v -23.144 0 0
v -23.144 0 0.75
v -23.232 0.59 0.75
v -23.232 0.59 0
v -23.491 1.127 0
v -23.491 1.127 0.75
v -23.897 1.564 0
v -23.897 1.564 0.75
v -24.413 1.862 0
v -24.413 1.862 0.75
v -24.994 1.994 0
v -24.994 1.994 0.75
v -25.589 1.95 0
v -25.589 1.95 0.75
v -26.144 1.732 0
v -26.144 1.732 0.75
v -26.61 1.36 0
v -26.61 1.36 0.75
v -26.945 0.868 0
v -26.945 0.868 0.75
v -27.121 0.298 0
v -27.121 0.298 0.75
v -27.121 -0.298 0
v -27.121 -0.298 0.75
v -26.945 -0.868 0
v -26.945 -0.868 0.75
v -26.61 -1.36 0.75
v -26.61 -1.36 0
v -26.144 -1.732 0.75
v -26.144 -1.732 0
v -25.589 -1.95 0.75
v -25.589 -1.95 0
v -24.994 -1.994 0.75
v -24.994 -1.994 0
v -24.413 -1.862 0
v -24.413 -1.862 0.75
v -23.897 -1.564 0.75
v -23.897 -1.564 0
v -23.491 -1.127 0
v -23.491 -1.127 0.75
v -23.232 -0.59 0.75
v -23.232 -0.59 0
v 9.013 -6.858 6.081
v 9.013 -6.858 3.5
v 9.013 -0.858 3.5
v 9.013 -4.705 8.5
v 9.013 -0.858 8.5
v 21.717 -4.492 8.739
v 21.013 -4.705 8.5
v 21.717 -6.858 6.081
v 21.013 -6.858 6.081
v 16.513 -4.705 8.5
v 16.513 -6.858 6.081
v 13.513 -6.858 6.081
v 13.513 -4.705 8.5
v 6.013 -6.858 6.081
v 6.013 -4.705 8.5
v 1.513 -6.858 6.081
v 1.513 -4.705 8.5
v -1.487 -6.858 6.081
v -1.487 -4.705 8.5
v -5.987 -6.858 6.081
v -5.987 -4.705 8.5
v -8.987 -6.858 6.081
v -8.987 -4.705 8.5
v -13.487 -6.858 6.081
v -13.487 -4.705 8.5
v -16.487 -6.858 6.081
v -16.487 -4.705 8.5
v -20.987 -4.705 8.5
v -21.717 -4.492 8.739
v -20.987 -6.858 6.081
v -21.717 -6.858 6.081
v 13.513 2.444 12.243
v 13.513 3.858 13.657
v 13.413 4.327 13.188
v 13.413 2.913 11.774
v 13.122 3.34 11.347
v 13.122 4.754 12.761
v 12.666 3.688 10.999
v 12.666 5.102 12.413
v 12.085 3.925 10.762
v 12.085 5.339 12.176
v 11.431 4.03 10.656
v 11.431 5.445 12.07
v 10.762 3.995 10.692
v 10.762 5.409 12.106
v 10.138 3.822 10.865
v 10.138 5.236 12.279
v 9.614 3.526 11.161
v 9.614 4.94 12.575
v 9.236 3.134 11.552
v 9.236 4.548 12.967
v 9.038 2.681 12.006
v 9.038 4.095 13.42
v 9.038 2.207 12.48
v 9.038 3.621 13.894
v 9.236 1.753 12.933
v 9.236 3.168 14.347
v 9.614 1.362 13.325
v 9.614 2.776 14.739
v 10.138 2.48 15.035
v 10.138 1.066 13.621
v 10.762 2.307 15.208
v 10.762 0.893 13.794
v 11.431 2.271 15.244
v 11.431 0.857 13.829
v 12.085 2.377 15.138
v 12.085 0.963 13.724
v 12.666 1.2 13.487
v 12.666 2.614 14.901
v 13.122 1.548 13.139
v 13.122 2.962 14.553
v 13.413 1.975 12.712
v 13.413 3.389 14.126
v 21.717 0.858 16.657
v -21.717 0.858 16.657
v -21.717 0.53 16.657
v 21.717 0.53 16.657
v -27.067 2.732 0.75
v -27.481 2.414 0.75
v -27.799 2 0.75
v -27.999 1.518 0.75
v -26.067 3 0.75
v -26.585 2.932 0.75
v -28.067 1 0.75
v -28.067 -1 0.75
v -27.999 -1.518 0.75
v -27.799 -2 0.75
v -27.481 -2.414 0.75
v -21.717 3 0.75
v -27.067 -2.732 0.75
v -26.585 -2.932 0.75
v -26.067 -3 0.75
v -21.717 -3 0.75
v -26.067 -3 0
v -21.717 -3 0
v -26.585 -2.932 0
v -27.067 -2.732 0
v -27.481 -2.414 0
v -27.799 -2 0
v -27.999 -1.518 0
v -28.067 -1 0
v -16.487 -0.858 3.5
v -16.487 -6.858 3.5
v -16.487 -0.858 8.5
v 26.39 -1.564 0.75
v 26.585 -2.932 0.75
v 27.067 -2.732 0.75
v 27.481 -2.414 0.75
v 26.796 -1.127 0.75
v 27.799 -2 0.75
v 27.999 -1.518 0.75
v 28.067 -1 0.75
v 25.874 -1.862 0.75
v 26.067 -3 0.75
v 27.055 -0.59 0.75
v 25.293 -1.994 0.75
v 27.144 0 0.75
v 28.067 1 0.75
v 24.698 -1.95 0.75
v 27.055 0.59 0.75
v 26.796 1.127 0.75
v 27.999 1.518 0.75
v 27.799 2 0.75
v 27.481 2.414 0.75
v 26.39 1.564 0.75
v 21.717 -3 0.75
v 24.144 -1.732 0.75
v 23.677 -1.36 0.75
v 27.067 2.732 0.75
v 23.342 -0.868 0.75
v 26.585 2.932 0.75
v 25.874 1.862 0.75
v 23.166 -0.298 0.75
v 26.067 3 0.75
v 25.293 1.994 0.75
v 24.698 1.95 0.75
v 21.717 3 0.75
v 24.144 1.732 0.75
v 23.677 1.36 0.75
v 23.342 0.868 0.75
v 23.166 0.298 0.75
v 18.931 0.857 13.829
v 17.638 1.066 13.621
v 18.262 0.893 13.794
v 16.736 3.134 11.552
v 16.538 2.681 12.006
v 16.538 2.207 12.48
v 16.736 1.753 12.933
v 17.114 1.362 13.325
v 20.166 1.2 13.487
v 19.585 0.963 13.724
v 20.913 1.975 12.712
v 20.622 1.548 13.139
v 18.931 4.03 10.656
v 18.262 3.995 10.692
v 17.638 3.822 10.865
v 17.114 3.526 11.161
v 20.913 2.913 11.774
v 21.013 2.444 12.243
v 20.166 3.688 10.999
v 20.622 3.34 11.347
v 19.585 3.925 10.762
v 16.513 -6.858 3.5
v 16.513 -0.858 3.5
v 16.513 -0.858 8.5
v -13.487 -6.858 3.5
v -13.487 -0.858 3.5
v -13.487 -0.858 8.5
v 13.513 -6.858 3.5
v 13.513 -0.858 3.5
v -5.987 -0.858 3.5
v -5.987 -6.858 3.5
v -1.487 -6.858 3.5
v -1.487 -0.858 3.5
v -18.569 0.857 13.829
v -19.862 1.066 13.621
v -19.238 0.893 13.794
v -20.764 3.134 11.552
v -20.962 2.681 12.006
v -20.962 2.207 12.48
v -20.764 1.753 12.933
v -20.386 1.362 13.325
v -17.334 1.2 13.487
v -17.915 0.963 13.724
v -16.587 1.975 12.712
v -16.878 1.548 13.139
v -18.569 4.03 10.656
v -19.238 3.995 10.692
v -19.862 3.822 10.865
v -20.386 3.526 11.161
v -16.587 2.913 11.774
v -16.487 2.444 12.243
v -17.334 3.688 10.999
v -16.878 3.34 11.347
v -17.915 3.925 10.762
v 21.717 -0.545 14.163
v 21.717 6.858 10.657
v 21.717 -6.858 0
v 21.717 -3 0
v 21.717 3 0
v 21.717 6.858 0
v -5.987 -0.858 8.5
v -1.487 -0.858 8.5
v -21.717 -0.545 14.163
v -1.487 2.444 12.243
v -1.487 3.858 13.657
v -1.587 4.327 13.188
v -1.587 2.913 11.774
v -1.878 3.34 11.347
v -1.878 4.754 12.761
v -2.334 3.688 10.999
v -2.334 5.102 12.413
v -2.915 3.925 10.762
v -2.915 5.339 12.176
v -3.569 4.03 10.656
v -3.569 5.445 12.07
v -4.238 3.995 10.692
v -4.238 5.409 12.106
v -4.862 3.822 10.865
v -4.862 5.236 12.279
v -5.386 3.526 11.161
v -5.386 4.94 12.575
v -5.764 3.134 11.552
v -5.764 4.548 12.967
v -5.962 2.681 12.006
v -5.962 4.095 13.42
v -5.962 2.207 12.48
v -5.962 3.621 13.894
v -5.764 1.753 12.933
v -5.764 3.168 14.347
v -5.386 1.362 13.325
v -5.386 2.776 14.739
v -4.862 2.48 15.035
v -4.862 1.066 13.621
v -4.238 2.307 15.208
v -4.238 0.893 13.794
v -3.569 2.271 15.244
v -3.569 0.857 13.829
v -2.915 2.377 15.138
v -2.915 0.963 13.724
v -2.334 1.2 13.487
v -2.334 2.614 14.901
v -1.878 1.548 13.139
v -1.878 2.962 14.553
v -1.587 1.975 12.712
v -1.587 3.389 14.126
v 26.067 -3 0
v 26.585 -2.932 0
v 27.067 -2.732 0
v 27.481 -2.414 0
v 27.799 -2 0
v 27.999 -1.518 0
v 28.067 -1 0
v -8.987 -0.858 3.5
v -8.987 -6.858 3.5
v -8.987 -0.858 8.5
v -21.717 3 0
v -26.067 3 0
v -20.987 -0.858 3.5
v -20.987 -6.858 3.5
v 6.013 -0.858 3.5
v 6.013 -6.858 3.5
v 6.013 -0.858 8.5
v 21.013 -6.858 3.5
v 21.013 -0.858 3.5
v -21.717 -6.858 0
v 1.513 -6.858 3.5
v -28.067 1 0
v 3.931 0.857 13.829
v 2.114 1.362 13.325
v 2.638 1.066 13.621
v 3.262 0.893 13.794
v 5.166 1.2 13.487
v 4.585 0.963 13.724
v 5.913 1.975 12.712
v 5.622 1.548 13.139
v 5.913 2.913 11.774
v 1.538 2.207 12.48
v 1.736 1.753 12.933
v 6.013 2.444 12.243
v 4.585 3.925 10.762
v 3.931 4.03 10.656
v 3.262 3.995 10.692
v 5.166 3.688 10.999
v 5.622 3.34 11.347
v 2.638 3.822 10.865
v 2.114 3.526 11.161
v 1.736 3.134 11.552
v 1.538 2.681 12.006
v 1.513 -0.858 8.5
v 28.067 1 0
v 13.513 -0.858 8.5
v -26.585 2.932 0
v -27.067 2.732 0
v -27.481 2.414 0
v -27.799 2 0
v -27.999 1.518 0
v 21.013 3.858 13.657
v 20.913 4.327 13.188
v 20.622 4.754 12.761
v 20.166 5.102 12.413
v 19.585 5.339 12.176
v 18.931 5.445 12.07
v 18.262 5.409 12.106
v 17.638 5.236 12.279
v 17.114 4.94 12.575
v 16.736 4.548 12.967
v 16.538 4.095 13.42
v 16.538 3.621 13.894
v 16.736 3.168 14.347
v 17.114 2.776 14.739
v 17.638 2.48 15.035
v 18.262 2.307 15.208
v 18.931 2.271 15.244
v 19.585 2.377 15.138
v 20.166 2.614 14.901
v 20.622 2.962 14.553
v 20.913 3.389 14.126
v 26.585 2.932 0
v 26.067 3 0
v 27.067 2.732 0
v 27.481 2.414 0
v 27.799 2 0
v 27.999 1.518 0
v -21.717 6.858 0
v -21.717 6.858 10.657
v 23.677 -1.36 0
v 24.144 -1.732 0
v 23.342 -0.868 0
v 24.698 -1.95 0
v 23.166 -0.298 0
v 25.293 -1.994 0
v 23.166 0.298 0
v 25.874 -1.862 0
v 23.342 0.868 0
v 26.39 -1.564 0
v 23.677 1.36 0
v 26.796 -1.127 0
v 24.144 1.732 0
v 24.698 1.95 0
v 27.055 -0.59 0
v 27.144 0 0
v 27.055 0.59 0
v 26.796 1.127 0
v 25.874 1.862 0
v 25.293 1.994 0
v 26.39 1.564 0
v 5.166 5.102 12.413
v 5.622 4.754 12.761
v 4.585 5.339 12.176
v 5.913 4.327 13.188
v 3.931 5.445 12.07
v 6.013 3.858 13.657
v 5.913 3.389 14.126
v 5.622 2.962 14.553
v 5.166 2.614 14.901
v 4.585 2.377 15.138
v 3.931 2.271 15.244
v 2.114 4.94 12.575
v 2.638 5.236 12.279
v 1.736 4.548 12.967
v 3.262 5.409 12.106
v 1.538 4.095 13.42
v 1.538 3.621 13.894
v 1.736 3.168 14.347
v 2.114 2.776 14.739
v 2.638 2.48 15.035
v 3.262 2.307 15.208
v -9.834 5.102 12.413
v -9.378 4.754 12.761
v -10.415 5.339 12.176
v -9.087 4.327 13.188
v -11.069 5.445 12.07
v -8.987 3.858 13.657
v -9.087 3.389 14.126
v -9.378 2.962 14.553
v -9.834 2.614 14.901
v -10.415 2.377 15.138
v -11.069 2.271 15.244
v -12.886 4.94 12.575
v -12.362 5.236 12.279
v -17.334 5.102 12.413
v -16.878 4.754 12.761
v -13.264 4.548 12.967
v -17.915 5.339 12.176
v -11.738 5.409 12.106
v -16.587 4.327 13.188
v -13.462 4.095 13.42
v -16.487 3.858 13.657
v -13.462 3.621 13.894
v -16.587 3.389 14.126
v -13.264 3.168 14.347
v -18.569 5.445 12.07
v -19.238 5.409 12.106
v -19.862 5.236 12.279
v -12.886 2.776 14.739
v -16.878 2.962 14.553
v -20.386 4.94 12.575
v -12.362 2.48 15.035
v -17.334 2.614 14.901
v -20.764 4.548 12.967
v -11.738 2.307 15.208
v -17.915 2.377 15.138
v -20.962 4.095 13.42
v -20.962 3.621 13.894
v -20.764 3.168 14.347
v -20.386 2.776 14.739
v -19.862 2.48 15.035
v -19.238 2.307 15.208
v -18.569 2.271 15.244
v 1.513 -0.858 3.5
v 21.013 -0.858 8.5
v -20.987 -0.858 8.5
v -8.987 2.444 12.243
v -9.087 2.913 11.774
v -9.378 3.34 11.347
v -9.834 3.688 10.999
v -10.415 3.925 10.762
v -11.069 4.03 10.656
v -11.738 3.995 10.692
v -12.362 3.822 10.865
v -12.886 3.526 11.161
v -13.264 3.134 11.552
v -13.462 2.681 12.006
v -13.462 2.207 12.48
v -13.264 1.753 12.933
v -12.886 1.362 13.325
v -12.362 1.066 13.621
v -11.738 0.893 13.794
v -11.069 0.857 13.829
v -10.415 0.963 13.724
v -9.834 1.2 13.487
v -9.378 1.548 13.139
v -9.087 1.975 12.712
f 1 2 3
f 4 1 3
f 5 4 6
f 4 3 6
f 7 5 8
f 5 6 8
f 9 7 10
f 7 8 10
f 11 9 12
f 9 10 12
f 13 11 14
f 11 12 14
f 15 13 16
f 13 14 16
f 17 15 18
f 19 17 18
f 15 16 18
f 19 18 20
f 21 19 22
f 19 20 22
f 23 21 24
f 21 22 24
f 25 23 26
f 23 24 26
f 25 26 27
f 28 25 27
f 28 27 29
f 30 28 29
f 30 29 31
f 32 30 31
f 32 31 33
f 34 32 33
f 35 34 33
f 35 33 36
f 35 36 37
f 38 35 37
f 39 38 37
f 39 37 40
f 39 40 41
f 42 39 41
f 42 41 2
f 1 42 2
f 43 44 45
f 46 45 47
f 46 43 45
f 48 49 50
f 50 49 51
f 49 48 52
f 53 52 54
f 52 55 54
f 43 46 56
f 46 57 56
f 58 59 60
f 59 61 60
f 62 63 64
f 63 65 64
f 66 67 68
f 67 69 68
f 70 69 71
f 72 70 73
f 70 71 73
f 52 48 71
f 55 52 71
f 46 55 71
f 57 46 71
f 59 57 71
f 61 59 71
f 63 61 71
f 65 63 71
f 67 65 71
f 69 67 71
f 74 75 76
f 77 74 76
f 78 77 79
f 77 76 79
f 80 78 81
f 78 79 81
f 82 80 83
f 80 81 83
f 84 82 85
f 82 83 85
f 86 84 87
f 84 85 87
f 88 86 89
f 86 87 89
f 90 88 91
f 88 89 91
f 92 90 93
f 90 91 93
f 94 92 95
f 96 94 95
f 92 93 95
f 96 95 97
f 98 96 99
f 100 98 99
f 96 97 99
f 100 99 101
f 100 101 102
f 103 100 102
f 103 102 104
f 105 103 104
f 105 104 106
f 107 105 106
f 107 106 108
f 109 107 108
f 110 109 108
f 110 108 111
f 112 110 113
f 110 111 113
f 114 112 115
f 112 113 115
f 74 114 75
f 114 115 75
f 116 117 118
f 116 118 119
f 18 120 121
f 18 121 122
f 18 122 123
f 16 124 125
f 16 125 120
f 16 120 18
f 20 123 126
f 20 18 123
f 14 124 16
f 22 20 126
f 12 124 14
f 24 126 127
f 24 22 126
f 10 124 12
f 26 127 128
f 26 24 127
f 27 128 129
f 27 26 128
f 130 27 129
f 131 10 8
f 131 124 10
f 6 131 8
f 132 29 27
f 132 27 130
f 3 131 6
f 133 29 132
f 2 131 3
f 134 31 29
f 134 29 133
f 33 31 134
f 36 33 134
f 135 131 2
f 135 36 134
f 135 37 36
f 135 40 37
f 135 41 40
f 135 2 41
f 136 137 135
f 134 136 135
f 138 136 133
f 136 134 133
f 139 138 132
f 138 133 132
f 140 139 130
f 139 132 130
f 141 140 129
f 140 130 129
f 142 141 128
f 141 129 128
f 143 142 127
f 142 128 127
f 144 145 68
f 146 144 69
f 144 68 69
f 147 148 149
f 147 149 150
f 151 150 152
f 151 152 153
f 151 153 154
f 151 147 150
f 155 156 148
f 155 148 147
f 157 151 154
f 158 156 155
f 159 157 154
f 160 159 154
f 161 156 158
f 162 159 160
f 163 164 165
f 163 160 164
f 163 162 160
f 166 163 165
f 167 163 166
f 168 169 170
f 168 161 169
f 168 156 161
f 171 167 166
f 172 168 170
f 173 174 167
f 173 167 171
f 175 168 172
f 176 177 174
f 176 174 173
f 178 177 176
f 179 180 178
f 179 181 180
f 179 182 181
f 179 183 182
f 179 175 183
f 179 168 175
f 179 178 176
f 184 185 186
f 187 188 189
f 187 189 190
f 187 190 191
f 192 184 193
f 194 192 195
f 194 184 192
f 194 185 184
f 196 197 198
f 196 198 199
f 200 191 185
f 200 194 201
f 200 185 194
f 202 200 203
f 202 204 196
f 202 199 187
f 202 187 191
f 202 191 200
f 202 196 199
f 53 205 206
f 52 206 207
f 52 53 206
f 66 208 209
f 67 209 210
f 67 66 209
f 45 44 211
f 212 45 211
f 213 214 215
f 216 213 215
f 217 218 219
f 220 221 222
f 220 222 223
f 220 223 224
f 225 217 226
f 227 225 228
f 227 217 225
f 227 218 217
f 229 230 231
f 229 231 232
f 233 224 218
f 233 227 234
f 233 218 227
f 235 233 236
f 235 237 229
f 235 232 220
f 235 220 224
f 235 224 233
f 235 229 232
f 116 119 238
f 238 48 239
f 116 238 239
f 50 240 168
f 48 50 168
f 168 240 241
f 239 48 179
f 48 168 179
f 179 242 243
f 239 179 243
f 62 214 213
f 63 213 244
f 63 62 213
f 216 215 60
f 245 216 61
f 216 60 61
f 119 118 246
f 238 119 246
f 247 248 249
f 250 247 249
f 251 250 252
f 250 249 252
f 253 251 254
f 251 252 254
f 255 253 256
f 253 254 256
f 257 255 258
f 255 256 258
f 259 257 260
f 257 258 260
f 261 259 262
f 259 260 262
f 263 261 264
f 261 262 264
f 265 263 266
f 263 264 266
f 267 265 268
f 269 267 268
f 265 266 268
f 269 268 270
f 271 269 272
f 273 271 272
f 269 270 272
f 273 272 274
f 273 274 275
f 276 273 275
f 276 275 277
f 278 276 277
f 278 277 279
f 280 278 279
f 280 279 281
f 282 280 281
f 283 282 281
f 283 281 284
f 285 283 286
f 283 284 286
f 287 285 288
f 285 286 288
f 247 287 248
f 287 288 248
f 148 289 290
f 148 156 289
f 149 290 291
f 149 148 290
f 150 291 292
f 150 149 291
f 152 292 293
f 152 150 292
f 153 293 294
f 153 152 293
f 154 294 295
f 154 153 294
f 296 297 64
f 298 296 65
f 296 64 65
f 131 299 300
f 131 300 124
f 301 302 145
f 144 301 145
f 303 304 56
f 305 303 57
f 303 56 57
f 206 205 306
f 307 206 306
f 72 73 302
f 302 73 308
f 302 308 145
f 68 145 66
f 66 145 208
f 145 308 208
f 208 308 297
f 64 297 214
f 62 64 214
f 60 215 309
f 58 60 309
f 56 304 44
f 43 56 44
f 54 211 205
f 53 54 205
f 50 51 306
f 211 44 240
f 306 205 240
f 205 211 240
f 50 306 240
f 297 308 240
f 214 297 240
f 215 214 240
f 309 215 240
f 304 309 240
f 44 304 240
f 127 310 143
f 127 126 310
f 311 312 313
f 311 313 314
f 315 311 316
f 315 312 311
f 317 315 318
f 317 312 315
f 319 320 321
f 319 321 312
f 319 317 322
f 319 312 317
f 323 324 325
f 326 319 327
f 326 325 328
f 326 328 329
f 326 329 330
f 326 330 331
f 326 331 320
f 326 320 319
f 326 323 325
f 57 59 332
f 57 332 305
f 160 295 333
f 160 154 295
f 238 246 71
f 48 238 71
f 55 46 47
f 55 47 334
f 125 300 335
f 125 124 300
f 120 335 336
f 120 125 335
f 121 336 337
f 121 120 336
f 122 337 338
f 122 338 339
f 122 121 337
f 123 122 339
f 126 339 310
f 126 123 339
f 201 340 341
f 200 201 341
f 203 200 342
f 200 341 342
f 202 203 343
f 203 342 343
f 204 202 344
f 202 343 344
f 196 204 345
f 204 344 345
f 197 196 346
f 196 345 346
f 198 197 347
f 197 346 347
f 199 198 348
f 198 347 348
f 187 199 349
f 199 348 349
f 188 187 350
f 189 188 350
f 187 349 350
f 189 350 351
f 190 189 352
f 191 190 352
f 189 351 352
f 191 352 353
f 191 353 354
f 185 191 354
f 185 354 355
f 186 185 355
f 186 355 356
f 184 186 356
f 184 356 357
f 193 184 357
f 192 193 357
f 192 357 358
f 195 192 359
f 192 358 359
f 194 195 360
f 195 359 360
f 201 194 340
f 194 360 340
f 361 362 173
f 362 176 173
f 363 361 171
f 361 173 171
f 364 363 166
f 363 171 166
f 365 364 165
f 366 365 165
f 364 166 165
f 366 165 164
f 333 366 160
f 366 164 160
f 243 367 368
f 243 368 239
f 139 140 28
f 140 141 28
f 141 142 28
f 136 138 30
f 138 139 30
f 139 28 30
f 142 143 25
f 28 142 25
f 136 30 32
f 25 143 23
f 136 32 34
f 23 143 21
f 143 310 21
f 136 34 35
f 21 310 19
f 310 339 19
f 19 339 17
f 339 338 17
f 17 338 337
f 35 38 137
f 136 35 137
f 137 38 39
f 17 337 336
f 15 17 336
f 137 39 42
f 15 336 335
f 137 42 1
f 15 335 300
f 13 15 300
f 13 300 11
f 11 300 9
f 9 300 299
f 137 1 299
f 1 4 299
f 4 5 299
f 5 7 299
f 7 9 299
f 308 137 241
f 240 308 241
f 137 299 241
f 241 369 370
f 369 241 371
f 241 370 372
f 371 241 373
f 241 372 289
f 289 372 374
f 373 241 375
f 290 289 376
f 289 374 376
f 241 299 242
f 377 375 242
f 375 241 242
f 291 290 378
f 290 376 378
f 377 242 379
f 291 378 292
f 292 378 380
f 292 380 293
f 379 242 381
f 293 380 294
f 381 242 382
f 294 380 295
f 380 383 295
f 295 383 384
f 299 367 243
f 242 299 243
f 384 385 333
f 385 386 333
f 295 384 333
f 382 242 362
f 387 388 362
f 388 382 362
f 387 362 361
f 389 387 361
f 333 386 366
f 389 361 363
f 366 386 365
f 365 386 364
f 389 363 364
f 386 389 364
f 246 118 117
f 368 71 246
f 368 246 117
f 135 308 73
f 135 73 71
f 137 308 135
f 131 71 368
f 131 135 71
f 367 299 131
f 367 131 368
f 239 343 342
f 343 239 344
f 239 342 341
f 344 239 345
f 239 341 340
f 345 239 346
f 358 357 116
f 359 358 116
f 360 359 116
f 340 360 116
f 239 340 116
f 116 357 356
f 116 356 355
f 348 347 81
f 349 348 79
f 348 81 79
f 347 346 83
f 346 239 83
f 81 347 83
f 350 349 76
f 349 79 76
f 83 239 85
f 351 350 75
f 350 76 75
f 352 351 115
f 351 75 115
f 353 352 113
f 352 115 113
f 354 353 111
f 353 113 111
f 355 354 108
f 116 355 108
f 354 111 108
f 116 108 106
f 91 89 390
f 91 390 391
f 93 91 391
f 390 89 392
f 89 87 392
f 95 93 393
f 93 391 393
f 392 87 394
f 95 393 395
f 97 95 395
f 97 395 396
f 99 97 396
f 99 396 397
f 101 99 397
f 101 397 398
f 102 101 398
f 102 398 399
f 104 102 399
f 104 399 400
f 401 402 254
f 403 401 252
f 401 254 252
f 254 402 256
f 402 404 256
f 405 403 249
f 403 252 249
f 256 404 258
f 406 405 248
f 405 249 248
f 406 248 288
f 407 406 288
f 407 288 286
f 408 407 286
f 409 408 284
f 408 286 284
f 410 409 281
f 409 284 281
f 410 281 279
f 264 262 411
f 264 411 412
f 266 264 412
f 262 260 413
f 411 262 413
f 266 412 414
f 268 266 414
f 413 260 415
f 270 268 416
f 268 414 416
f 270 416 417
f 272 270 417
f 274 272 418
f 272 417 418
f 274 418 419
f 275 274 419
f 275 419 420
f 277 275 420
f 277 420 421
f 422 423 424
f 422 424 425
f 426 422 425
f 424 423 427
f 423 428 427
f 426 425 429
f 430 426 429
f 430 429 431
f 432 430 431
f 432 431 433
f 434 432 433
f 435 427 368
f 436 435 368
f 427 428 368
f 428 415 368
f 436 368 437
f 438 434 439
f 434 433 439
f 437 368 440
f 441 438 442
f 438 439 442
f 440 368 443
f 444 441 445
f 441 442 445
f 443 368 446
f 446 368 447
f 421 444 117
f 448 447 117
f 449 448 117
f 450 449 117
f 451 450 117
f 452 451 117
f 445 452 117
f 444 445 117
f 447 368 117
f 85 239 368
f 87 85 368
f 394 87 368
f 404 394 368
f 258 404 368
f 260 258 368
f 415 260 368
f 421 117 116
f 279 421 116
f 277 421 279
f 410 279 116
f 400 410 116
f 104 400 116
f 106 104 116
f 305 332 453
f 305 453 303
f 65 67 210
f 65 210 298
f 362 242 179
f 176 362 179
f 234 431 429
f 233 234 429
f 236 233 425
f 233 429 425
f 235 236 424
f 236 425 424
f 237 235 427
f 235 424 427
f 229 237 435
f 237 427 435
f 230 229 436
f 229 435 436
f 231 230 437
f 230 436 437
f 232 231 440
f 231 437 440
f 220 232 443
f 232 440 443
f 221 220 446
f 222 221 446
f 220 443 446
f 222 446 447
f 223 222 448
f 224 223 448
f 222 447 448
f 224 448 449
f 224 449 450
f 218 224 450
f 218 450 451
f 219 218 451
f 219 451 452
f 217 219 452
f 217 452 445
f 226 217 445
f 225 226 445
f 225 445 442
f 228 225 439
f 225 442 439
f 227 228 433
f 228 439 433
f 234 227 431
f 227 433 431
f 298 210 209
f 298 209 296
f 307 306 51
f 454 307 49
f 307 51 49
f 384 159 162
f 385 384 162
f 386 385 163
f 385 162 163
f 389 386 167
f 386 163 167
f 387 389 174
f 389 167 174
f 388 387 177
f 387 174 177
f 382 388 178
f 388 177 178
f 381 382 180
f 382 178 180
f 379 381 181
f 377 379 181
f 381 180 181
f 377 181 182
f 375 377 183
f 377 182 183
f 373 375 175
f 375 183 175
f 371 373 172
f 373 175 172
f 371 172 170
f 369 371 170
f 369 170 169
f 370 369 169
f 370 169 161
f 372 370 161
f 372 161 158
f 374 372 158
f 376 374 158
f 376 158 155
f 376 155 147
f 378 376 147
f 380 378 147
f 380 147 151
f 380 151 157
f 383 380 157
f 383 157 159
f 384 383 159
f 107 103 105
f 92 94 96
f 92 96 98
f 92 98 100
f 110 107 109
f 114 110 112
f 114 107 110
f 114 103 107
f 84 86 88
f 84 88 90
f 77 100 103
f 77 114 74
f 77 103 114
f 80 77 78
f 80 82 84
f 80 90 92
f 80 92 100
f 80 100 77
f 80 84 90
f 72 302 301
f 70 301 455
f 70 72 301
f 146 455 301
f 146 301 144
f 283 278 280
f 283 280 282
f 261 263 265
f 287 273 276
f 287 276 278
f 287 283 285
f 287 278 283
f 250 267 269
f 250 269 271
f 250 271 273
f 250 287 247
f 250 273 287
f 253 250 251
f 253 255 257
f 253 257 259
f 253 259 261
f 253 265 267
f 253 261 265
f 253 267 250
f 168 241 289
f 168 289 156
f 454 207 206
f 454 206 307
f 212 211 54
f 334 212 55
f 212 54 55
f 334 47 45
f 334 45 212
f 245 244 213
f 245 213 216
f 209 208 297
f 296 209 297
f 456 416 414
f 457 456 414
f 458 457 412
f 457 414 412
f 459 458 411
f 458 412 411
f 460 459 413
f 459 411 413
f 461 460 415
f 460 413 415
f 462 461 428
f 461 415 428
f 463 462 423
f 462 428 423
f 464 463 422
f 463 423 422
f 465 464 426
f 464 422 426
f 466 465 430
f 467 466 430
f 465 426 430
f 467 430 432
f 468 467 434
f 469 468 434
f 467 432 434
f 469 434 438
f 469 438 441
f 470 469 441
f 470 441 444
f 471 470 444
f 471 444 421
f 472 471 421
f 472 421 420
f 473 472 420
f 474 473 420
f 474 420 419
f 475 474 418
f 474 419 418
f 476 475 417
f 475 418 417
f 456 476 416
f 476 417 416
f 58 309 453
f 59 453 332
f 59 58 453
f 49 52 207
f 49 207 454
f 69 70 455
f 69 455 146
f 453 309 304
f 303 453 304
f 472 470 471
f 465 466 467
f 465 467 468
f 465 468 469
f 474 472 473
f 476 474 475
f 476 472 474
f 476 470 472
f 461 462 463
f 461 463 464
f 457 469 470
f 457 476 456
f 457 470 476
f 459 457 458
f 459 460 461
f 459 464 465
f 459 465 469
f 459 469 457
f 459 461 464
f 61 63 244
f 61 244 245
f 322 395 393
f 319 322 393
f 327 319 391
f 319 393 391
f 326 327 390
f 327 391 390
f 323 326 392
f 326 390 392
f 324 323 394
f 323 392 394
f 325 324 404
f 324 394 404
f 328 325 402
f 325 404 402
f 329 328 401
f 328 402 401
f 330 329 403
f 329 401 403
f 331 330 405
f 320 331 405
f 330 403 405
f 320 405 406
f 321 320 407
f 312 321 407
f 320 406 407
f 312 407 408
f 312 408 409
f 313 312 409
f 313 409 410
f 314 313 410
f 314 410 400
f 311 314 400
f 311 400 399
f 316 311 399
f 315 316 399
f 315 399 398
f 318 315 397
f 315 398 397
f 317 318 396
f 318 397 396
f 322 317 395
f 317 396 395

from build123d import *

# Parameters (mm, degrees)
F0_W      = 43.434
F0_H      = 13.716
F1_DEPTH  = 16.657
F3_DEPTH  = 43.435
F4_W      = 4.5
F4_H      = 5
F5_DEPTH  = 6
F6_R      = 2.25
F7_DEPTH  = 2
F8_W      = 6
F8_H      = 0.75
F9_DEPTH  = 6.35
F10_W     = 6
F10_H     = 0.75
F11_DEPTH = 6.35
F12_R     = 2
F13_R     = 2
F14_DEPTH = 0.751
F15_R     = 2
F16_DEPTH = 0.751


# Not quite as in the source:
# - a feature names something its author has since deleted; it is built from what else it names


with BuildPart() as f1:
    # F0 (on Top) → F1 (new body)
    with BuildSketch(Plane.XY):
        Rectangle(F0_W, F0_H)
    extrude(amount=F1_DEPTH)

    # F2 (on face) → F3 (cut, through all)
    with BuildSketch(Plane(origin=(-21.717, 0, 0), x_dir=(0, -1, 0), z_dir=(-1, 0, 0))):
        Polygon((-6.858, 10.657), (-0.858, 16.657), (-6.858, 16.657), align=None)
        Polygon((6.858, 16.657), (-0.5295271985, 16.657), (0.5445904681, 14.1634047031), (4.491972737, 8.7391110137), (6.858, 6.0806702822), align=None)
    extrude(amount=-F3_DEPTH, mode=Mode.SUBTRACT)

    # F4 (on face) → F5 (cut)
    with BuildSketch(Plane.XZ.offset(6.858)):
        with Locations((-18.737, 6)):
            Rectangle(F4_W, F4_H)
        with Locations((-11.237, 6)):
            Rectangle(F4_W, F4_H)
        with Locations((-3.737, 6)):
            Rectangle(F4_W, F4_H)
        with Locations((3.763, 6)):
            Rectangle(F4_W, F4_H)
        with Locations((11.263, 6)):
            Rectangle(F4_W, F4_H)
        with Locations((18.763, 6)):
            Rectangle(F4_W, F4_H)
        with Locations((26.263, 6)):
            Rectangle(F4_W, F4_H)
        with Locations((33.763, 6)):
            Rectangle(F4_W, F4_H)
        with Locations((41.263, 6)):
            Rectangle(F4_W, F4_H)
        with Locations((48.763, 6)):
            Rectangle(F4_W, F4_H)
        with Locations((56.263, 6)):
            Rectangle(F4_W, F4_H)
        with Locations((63.763, 6)):
            Rectangle(F4_W, F4_H)
    extrude(amount=-F5_DEPTH, mode=Mode.SUBTRACT)

    # F6 (on face) → F7 (cut)
    with BuildSketch(Plane(origin=(0, 8.7575, 8.7575), x_dir=(1, 0, 0), z_dir=(0, 0.7071067812, 0.7071067812))):
        with Locations((-18.737, -6.9289393488)):
            Circle(F6_R)
        with Locations((-11.237, -6.9289393488)):
            Circle(F6_R)
        with Locations((-3.737, -6.9289393488)):
            Circle(F6_R)
        with Locations((3.763, -6.9289393488)):
            Circle(F6_R)
        with Locations((11.263, -6.9289393488)):
            Circle(F6_R)
        with Locations((18.763, -6.9289393488)):
            Circle(F6_R)
        with Locations((26.263, -6.9289393488)):
            Circle(F6_R)
        with Locations((33.763, -6.9289393488)):
            Circle(F6_R)
        with Locations((41.263, -6.9289393488)):
            Circle(F6_R)
        with Locations((48.763, -6.9289393488)):
            Circle(F6_R)
        with Locations((56.263, -6.9289393488)):
            Circle(F6_R)
        with Locations((63.763, -6.9289393488)):
            Circle(F6_R)
    extrude(amount=-F7_DEPTH, mode=Mode.SUBTRACT)

    # F8 (on face) → F9 (join)
    with BuildSketch(Plane(origin=(-21.717, 0, 0), x_dir=(0, -1, 0), z_dir=(-1, 0, 0))):
        with Locations((0, 0.375)):
            Rectangle(F8_W, F8_H)
    extrude(amount=F9_DEPTH)

    # F10 (on face) → F11 (join)
    with BuildSketch(Plane.YZ.offset(21.717)):
        with Locations((0, 0.375)):
            Rectangle(F10_W, F10_H)
    extrude(amount=F11_DEPTH)

    # F12
    f12_edges = [f1.edges().sort_by_distance(p)[0] for p in [
        (-28.067, 3, 0.375),
        (-28.067, -3, 0.375),
        (28.067, -3, 0.375),
        (28.067, 3, 0.375),
    ]]
    fillet(f12_edges, radius=F12_R)

    # F13 (on face) → F14 (cut, through all)
    with BuildSketch(Plane.XY.offset(0.75)):
        with Locations((-25.1435, 0)):
            Circle(F13_R)
    extrude(amount=-F14_DEPTH, mode=Mode.SUBTRACT)

    # F15 (on face) → F16 (cut, through all)
    with BuildSketch(Plane.XY.offset(0.75)):
        with Locations((25.1435, 0)):
            Circle(F15_R)
    extrude(amount=-F16_DEPTH, mode=Mode.SUBTRACT)


solid = f1.part
